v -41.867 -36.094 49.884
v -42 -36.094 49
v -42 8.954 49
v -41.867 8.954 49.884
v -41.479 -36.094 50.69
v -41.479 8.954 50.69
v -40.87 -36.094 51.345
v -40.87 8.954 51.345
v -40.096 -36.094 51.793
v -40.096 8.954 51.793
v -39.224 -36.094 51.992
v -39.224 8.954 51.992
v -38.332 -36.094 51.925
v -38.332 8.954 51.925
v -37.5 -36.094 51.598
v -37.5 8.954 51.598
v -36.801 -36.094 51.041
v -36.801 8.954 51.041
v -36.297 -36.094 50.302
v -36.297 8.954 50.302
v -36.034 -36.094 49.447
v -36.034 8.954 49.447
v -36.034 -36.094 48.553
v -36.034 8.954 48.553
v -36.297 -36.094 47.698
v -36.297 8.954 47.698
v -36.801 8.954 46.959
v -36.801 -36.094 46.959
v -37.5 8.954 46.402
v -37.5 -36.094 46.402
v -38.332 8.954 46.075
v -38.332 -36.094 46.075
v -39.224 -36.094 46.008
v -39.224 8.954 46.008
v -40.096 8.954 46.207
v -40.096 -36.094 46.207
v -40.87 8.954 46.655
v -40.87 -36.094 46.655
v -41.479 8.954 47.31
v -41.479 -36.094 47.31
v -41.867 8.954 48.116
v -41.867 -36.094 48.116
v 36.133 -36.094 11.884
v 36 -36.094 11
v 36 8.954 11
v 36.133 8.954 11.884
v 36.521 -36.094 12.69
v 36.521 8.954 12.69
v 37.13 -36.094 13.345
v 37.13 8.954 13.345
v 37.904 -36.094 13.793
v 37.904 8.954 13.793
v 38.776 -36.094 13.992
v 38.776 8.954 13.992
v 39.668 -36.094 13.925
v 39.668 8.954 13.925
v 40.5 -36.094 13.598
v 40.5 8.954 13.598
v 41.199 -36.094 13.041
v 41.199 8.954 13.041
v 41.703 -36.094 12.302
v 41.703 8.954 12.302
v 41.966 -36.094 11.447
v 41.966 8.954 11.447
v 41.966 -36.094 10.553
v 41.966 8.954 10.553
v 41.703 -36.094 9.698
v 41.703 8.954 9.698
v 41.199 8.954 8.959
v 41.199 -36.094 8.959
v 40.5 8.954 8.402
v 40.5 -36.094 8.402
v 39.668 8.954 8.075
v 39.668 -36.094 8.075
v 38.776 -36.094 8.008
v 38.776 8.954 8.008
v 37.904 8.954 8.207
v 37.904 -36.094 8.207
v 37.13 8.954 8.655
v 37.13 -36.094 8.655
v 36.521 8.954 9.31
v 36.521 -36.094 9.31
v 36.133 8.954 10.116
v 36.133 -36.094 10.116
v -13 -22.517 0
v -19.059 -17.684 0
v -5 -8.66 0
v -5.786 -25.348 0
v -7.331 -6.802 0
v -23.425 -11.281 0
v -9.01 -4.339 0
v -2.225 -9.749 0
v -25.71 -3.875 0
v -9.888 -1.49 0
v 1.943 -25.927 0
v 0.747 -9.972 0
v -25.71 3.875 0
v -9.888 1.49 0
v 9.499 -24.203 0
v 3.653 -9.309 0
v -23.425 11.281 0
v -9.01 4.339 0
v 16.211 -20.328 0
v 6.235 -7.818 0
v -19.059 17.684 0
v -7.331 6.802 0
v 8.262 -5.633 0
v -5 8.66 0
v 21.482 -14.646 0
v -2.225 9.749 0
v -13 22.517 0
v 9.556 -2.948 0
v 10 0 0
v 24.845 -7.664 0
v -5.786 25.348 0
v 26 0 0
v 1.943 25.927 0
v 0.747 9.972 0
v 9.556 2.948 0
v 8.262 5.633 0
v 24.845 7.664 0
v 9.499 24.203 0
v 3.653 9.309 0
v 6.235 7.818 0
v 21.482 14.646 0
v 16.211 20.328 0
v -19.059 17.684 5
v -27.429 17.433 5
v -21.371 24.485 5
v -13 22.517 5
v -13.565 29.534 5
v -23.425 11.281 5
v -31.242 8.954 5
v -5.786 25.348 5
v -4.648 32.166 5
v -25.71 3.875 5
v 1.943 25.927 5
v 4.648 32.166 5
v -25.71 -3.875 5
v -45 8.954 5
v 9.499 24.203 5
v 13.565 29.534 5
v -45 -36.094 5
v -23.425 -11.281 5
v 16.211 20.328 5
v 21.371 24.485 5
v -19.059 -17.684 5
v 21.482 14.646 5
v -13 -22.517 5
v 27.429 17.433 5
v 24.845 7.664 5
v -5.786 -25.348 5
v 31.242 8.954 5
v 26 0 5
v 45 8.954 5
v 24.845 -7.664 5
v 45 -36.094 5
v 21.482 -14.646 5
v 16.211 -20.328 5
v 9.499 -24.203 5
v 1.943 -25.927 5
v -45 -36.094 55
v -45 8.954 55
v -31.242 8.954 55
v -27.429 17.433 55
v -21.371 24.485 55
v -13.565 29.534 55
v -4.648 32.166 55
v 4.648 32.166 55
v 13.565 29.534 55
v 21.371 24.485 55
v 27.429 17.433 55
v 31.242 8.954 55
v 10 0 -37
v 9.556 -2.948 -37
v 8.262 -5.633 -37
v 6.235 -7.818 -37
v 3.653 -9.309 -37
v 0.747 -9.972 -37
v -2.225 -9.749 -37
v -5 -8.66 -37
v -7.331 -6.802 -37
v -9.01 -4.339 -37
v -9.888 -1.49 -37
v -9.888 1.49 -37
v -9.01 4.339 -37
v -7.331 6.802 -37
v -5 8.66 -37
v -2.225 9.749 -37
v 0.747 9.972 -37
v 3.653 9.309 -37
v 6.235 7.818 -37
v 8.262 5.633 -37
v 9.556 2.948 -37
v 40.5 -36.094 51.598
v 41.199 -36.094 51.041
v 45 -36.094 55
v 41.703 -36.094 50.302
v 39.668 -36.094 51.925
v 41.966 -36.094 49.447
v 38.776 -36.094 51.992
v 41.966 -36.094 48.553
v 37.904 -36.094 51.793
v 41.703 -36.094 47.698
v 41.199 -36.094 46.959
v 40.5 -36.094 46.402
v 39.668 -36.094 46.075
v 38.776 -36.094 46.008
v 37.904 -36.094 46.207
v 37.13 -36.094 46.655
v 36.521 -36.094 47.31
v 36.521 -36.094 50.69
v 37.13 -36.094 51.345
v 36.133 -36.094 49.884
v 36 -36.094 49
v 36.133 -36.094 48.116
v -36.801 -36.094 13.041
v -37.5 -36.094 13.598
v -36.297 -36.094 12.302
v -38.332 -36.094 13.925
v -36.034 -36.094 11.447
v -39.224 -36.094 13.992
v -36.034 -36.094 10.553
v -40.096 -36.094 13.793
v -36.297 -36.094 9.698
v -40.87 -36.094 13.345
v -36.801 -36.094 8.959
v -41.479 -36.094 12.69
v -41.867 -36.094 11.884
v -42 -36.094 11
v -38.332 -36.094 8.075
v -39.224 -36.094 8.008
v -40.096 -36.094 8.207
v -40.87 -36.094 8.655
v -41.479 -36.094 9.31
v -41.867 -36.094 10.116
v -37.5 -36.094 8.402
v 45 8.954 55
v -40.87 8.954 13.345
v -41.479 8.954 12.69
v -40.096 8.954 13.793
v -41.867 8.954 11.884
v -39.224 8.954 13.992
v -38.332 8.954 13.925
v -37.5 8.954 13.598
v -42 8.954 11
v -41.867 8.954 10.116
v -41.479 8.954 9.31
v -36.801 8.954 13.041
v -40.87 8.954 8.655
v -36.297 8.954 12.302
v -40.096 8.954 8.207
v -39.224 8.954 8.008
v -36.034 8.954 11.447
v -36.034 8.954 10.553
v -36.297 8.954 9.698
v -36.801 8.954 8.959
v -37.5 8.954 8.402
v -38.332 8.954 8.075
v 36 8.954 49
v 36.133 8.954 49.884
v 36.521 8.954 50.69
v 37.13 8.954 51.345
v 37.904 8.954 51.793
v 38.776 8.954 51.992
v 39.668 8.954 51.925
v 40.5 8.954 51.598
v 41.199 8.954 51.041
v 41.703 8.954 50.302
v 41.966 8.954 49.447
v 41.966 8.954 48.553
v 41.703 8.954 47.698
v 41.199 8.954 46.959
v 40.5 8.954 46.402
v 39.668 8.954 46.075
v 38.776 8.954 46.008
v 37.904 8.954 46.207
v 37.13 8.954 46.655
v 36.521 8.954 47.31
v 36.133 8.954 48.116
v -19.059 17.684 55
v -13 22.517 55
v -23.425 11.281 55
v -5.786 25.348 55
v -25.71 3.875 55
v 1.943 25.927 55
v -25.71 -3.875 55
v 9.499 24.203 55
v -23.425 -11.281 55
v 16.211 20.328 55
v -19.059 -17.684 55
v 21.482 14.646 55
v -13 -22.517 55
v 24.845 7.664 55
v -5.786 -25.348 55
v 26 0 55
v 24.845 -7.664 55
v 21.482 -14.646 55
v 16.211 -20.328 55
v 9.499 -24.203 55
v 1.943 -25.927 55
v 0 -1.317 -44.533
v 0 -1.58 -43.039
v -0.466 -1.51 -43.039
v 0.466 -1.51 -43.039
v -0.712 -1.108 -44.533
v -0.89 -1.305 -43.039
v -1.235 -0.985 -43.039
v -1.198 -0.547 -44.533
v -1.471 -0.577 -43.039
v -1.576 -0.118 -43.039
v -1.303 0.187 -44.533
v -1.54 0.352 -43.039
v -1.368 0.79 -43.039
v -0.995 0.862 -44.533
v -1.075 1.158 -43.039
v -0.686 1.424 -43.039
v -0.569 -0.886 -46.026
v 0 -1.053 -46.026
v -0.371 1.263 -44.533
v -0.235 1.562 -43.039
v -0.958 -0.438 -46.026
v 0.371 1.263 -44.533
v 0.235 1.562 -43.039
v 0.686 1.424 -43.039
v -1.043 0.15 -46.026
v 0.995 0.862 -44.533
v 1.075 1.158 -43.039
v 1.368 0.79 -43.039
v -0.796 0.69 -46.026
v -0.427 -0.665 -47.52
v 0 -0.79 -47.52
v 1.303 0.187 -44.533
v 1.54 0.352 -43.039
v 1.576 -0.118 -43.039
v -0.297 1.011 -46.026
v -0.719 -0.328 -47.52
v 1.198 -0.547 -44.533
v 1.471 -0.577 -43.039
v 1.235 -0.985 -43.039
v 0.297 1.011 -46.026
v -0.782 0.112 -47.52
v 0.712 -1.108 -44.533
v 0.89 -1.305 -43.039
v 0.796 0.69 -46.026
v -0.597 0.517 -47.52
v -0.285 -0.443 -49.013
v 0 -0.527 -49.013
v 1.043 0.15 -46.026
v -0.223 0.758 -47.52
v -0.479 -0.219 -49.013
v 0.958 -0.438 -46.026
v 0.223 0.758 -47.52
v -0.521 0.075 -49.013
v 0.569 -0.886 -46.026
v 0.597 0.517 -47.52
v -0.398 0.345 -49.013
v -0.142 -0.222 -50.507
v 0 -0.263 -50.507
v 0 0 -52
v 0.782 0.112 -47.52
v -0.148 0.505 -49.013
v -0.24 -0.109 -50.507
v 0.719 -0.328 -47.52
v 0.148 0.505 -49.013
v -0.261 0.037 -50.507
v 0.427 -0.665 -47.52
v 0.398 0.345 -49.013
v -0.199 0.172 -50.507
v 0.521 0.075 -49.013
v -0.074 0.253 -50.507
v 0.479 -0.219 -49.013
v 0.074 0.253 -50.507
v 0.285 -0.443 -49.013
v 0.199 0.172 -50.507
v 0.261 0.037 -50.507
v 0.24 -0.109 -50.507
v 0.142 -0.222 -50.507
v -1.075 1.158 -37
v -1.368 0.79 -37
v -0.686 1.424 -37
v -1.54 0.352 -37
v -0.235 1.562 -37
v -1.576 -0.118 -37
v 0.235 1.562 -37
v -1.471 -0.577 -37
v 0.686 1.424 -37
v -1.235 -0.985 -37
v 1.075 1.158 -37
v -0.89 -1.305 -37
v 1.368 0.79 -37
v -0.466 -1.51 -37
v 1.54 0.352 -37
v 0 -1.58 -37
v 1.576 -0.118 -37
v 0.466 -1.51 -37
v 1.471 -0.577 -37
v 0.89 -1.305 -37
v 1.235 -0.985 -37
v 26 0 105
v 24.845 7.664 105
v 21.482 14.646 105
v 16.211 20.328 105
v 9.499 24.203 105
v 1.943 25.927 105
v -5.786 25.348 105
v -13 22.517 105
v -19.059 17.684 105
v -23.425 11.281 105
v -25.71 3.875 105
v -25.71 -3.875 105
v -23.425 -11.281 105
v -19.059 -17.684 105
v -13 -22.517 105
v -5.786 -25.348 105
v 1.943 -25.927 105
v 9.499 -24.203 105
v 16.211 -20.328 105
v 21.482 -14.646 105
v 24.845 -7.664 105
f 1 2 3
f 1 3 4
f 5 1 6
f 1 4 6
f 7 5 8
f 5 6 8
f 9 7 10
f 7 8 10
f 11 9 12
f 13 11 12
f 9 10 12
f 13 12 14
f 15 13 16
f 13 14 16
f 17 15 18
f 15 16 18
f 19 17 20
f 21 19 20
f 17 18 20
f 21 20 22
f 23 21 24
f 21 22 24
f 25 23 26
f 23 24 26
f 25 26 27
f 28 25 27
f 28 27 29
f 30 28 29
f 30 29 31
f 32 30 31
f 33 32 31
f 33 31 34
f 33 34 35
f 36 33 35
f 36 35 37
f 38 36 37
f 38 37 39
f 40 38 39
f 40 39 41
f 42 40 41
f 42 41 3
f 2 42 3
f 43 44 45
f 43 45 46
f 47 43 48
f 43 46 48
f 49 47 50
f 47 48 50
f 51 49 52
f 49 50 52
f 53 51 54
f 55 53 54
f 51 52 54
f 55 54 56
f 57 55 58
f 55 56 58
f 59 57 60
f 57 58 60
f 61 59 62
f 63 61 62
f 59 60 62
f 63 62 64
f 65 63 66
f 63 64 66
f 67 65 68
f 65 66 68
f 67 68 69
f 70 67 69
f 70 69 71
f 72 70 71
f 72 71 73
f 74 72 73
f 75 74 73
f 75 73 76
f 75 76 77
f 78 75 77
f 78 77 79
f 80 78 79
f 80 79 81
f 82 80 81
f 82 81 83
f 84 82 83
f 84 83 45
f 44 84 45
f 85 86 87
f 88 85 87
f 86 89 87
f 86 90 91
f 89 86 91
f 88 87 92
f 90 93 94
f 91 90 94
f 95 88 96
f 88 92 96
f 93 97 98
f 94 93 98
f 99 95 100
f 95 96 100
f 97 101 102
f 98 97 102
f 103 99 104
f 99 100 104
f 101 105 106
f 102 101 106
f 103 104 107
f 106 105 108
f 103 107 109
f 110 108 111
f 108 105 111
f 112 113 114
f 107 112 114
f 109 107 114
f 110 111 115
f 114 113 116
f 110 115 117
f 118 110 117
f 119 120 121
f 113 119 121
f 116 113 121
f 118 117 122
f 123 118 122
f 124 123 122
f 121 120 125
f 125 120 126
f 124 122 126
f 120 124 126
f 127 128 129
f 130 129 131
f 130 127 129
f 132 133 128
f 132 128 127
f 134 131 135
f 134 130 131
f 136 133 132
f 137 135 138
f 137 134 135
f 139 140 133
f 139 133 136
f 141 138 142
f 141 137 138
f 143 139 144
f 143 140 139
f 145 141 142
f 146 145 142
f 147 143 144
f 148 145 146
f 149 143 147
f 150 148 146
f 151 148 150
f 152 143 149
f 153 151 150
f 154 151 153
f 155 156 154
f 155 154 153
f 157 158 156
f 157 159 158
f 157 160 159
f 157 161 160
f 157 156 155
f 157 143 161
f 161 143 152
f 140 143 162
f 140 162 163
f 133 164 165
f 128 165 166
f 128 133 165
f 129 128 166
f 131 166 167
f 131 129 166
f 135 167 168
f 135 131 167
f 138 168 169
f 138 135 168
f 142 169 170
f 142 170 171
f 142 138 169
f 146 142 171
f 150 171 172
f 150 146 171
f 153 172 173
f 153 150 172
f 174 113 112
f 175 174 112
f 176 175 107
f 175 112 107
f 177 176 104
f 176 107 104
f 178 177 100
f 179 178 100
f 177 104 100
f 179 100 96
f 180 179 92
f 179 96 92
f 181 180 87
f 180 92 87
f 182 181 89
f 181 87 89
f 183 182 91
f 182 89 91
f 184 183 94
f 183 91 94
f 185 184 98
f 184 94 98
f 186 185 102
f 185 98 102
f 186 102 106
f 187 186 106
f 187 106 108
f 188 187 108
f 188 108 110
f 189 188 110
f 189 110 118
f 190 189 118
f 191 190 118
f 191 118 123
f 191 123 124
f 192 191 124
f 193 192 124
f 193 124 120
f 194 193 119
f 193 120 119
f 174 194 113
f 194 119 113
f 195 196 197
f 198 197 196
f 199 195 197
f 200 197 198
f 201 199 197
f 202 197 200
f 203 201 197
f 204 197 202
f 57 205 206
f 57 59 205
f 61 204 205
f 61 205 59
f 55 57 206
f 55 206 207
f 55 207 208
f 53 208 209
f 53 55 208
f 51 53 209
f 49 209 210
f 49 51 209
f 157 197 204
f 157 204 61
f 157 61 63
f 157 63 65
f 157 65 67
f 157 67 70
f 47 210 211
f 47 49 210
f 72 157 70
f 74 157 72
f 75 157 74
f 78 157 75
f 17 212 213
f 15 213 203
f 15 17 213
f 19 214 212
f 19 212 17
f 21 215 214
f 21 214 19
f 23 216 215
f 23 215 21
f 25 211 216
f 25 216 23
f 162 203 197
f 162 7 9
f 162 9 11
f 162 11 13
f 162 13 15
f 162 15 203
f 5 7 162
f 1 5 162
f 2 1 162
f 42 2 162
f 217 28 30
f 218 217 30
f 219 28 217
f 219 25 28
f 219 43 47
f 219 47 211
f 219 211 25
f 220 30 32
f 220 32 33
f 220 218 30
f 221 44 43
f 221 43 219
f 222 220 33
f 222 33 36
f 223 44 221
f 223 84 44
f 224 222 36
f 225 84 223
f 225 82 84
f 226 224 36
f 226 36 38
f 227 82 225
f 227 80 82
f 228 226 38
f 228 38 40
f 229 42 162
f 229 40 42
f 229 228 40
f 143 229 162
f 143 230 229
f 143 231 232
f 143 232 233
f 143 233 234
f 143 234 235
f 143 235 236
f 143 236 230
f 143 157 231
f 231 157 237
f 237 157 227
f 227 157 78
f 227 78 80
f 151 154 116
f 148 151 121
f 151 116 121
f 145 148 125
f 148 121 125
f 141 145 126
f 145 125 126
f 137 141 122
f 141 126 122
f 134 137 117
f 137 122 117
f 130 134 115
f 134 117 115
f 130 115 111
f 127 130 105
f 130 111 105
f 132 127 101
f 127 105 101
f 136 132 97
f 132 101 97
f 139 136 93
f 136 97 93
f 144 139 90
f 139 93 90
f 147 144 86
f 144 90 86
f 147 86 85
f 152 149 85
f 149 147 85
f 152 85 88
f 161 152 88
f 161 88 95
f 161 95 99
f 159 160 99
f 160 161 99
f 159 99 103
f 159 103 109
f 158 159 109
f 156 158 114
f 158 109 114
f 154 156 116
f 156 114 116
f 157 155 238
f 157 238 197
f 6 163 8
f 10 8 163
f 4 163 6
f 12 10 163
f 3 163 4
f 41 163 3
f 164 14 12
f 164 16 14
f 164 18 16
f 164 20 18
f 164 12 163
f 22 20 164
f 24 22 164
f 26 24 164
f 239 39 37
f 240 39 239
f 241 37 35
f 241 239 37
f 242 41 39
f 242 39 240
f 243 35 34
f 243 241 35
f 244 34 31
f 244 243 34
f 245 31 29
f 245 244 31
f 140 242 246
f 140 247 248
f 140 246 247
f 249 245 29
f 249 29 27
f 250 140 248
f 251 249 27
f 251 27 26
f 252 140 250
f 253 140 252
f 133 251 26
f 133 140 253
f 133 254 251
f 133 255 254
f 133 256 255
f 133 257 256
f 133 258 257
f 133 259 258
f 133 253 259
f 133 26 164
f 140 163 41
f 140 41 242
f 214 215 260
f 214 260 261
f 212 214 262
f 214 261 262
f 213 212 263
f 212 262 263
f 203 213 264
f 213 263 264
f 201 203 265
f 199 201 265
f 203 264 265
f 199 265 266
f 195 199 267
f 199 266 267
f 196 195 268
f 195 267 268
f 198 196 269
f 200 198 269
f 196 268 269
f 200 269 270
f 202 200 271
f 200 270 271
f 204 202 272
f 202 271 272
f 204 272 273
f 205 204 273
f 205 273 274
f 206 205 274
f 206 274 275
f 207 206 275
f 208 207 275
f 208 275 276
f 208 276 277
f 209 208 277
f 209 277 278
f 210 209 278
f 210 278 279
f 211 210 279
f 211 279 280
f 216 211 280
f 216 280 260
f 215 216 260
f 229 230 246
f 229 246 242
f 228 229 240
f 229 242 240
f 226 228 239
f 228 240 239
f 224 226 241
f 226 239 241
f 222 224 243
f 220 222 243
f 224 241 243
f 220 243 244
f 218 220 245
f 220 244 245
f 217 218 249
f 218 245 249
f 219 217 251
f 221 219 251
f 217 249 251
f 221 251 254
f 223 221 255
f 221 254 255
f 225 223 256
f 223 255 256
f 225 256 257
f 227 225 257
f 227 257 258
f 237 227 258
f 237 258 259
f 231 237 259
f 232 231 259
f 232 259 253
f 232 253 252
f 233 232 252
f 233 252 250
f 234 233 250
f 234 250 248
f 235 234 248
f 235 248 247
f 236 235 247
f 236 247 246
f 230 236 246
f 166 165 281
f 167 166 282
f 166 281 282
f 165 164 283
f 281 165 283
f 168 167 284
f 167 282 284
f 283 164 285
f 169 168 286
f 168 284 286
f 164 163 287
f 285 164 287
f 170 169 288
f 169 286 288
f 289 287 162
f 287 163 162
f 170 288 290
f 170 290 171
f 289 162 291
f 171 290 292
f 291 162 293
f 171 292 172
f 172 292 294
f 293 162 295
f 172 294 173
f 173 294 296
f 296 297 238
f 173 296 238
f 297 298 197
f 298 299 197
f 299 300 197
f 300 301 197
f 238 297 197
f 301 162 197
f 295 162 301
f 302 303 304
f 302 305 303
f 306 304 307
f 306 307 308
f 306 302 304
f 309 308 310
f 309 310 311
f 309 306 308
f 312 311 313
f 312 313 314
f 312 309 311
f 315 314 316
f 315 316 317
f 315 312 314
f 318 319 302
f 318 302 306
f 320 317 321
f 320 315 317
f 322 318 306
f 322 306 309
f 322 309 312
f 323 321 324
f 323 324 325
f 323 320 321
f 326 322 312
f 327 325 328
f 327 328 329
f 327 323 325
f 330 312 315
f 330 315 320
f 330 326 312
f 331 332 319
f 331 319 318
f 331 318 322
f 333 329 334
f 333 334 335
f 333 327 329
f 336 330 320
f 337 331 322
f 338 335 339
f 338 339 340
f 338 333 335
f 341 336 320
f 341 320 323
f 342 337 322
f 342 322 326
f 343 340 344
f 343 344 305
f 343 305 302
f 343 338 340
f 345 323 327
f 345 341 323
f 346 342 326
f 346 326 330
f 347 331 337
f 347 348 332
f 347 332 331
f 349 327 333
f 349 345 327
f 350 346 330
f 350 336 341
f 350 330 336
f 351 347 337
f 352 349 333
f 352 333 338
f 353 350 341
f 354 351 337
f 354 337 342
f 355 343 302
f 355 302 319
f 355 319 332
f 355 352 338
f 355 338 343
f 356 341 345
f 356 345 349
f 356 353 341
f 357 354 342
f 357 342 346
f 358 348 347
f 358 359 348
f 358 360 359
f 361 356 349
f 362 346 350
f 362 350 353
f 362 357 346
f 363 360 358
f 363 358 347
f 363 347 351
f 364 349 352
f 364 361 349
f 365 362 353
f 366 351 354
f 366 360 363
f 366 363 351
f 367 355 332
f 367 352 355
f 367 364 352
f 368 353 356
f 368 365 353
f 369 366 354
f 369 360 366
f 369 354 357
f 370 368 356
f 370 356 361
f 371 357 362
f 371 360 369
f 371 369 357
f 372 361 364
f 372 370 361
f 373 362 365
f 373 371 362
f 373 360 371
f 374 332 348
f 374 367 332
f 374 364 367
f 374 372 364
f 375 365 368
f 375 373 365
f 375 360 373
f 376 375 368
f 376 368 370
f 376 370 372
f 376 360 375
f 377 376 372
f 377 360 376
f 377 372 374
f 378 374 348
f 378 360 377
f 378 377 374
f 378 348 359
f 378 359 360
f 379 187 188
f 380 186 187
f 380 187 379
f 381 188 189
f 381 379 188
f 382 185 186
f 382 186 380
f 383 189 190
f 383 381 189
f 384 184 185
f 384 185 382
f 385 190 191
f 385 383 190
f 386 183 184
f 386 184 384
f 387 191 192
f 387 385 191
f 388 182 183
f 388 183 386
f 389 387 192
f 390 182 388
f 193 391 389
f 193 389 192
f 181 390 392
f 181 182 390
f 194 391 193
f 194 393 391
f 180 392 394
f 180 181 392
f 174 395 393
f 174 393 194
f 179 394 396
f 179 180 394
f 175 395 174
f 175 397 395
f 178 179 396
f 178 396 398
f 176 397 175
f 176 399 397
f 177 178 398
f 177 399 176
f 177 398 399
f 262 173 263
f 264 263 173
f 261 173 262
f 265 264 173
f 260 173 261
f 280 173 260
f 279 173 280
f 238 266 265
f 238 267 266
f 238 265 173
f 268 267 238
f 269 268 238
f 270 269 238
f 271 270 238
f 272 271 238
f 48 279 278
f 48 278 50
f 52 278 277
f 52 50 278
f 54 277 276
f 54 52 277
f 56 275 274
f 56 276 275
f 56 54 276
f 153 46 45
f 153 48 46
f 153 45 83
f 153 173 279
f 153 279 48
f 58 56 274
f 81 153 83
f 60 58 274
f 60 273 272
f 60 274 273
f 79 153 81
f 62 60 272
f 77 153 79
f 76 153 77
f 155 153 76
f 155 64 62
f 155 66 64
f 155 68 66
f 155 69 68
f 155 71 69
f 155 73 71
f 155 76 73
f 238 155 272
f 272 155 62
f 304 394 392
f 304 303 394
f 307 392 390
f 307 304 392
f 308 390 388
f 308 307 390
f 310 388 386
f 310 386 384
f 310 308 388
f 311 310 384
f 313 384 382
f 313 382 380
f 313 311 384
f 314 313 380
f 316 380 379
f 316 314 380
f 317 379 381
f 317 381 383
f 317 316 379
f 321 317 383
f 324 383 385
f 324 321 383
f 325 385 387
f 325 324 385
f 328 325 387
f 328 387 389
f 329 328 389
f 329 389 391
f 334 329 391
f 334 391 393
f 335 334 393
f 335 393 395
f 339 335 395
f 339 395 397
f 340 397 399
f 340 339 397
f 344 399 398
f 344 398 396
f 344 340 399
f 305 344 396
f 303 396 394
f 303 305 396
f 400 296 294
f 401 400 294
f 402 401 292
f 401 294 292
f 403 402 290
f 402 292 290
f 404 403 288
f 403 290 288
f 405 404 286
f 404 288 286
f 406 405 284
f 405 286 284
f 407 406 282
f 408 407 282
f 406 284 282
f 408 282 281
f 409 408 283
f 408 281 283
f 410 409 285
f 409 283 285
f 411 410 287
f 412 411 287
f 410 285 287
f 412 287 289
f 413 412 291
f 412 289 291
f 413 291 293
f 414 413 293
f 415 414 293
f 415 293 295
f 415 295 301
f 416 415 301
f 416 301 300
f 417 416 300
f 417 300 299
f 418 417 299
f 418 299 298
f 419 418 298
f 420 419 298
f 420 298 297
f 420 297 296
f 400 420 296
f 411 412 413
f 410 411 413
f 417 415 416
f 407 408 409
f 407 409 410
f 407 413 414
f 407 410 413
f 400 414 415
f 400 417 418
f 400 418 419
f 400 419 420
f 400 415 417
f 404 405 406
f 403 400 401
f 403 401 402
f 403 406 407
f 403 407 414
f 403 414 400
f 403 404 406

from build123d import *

# Parameters (mm, degrees)
F0_R     = 26
F1_DEPTH = 105
F2_R     = 10
F3_DEPTH = 37
F7_START = -5
F7_DEPTH = 50
F8_R     = 3
F9_DEPTH = 45.0490971485


with BuildPart() as f1:
    # F0 (on Top) → F1 (new body)
    with BuildSketch(Plane.XY):
        Circle(F0_R)
    extrude(amount=F1_DEPTH)

    # F2 (on face) → F3 (join)
    with BuildSketch(Plane(origin=(0, 0, 0), x_dir=(1, 0, 0), z_dir=(0, 0, -1))):
        Circle(F2_R)
    extrude(amount=F3_DEPTH)

    # F4 (on Right) → F5 (revolve)
    with BuildSketch(Plane.YZ):
        Polygon((0, -52), (0, -37), (-1.58, -37), (-1.58, -43.039374725), align=None)
    revolve(axis=Axis((0, 0, -44.5), (0, 0, -1)))

    # F6 (on face) → F7 (join)
    with BuildSketch(Plane(origin=(0, 0, 0), x_dir=(1, 0, 0), z_dir=(0, 0, -1)).offset(F7_START)):
        with BuildLine():
            Line((-45, -8.9544598013), (-31.2420813914, -8.9544598013))
            ThreePointArc((-31.2420813914, -8.9544598013), (0, -32.5), (31.2420813914, -8.9544598013))
            Line((31.2420813914, -8.9544598013), (45, -8.9544598013))
            Line((45, -8.9544598013), (45, 36.0936373472))
            Line((45, 36.0936373472), (-45, 36.0936373472))
            Line((-45, 36.0936373472), (-45, -8.9544598013))
        make_face()
    extrude(amount=-F7_DEPTH)

    # F8 (on face) → F9 (cut, through all)
    with BuildSketch(Plane(origin=(0, 8.9544598013, 0), x_dir=(-1, 0, 0), z_dir=(0, 1, 0))):
        with Locations((-39, 49)):
            Circle(F8_R)
        with Locations((-39, 11)):
            Circle(F8_R)
        with Locations((39, 49)):
            Circle(F8_R)
        with Locations((39, 11)):
            Circle(F8_R)
    extrude(amount=-F9_DEPTH, mode=Mode.SUBTRACT)


solid = f1.part
